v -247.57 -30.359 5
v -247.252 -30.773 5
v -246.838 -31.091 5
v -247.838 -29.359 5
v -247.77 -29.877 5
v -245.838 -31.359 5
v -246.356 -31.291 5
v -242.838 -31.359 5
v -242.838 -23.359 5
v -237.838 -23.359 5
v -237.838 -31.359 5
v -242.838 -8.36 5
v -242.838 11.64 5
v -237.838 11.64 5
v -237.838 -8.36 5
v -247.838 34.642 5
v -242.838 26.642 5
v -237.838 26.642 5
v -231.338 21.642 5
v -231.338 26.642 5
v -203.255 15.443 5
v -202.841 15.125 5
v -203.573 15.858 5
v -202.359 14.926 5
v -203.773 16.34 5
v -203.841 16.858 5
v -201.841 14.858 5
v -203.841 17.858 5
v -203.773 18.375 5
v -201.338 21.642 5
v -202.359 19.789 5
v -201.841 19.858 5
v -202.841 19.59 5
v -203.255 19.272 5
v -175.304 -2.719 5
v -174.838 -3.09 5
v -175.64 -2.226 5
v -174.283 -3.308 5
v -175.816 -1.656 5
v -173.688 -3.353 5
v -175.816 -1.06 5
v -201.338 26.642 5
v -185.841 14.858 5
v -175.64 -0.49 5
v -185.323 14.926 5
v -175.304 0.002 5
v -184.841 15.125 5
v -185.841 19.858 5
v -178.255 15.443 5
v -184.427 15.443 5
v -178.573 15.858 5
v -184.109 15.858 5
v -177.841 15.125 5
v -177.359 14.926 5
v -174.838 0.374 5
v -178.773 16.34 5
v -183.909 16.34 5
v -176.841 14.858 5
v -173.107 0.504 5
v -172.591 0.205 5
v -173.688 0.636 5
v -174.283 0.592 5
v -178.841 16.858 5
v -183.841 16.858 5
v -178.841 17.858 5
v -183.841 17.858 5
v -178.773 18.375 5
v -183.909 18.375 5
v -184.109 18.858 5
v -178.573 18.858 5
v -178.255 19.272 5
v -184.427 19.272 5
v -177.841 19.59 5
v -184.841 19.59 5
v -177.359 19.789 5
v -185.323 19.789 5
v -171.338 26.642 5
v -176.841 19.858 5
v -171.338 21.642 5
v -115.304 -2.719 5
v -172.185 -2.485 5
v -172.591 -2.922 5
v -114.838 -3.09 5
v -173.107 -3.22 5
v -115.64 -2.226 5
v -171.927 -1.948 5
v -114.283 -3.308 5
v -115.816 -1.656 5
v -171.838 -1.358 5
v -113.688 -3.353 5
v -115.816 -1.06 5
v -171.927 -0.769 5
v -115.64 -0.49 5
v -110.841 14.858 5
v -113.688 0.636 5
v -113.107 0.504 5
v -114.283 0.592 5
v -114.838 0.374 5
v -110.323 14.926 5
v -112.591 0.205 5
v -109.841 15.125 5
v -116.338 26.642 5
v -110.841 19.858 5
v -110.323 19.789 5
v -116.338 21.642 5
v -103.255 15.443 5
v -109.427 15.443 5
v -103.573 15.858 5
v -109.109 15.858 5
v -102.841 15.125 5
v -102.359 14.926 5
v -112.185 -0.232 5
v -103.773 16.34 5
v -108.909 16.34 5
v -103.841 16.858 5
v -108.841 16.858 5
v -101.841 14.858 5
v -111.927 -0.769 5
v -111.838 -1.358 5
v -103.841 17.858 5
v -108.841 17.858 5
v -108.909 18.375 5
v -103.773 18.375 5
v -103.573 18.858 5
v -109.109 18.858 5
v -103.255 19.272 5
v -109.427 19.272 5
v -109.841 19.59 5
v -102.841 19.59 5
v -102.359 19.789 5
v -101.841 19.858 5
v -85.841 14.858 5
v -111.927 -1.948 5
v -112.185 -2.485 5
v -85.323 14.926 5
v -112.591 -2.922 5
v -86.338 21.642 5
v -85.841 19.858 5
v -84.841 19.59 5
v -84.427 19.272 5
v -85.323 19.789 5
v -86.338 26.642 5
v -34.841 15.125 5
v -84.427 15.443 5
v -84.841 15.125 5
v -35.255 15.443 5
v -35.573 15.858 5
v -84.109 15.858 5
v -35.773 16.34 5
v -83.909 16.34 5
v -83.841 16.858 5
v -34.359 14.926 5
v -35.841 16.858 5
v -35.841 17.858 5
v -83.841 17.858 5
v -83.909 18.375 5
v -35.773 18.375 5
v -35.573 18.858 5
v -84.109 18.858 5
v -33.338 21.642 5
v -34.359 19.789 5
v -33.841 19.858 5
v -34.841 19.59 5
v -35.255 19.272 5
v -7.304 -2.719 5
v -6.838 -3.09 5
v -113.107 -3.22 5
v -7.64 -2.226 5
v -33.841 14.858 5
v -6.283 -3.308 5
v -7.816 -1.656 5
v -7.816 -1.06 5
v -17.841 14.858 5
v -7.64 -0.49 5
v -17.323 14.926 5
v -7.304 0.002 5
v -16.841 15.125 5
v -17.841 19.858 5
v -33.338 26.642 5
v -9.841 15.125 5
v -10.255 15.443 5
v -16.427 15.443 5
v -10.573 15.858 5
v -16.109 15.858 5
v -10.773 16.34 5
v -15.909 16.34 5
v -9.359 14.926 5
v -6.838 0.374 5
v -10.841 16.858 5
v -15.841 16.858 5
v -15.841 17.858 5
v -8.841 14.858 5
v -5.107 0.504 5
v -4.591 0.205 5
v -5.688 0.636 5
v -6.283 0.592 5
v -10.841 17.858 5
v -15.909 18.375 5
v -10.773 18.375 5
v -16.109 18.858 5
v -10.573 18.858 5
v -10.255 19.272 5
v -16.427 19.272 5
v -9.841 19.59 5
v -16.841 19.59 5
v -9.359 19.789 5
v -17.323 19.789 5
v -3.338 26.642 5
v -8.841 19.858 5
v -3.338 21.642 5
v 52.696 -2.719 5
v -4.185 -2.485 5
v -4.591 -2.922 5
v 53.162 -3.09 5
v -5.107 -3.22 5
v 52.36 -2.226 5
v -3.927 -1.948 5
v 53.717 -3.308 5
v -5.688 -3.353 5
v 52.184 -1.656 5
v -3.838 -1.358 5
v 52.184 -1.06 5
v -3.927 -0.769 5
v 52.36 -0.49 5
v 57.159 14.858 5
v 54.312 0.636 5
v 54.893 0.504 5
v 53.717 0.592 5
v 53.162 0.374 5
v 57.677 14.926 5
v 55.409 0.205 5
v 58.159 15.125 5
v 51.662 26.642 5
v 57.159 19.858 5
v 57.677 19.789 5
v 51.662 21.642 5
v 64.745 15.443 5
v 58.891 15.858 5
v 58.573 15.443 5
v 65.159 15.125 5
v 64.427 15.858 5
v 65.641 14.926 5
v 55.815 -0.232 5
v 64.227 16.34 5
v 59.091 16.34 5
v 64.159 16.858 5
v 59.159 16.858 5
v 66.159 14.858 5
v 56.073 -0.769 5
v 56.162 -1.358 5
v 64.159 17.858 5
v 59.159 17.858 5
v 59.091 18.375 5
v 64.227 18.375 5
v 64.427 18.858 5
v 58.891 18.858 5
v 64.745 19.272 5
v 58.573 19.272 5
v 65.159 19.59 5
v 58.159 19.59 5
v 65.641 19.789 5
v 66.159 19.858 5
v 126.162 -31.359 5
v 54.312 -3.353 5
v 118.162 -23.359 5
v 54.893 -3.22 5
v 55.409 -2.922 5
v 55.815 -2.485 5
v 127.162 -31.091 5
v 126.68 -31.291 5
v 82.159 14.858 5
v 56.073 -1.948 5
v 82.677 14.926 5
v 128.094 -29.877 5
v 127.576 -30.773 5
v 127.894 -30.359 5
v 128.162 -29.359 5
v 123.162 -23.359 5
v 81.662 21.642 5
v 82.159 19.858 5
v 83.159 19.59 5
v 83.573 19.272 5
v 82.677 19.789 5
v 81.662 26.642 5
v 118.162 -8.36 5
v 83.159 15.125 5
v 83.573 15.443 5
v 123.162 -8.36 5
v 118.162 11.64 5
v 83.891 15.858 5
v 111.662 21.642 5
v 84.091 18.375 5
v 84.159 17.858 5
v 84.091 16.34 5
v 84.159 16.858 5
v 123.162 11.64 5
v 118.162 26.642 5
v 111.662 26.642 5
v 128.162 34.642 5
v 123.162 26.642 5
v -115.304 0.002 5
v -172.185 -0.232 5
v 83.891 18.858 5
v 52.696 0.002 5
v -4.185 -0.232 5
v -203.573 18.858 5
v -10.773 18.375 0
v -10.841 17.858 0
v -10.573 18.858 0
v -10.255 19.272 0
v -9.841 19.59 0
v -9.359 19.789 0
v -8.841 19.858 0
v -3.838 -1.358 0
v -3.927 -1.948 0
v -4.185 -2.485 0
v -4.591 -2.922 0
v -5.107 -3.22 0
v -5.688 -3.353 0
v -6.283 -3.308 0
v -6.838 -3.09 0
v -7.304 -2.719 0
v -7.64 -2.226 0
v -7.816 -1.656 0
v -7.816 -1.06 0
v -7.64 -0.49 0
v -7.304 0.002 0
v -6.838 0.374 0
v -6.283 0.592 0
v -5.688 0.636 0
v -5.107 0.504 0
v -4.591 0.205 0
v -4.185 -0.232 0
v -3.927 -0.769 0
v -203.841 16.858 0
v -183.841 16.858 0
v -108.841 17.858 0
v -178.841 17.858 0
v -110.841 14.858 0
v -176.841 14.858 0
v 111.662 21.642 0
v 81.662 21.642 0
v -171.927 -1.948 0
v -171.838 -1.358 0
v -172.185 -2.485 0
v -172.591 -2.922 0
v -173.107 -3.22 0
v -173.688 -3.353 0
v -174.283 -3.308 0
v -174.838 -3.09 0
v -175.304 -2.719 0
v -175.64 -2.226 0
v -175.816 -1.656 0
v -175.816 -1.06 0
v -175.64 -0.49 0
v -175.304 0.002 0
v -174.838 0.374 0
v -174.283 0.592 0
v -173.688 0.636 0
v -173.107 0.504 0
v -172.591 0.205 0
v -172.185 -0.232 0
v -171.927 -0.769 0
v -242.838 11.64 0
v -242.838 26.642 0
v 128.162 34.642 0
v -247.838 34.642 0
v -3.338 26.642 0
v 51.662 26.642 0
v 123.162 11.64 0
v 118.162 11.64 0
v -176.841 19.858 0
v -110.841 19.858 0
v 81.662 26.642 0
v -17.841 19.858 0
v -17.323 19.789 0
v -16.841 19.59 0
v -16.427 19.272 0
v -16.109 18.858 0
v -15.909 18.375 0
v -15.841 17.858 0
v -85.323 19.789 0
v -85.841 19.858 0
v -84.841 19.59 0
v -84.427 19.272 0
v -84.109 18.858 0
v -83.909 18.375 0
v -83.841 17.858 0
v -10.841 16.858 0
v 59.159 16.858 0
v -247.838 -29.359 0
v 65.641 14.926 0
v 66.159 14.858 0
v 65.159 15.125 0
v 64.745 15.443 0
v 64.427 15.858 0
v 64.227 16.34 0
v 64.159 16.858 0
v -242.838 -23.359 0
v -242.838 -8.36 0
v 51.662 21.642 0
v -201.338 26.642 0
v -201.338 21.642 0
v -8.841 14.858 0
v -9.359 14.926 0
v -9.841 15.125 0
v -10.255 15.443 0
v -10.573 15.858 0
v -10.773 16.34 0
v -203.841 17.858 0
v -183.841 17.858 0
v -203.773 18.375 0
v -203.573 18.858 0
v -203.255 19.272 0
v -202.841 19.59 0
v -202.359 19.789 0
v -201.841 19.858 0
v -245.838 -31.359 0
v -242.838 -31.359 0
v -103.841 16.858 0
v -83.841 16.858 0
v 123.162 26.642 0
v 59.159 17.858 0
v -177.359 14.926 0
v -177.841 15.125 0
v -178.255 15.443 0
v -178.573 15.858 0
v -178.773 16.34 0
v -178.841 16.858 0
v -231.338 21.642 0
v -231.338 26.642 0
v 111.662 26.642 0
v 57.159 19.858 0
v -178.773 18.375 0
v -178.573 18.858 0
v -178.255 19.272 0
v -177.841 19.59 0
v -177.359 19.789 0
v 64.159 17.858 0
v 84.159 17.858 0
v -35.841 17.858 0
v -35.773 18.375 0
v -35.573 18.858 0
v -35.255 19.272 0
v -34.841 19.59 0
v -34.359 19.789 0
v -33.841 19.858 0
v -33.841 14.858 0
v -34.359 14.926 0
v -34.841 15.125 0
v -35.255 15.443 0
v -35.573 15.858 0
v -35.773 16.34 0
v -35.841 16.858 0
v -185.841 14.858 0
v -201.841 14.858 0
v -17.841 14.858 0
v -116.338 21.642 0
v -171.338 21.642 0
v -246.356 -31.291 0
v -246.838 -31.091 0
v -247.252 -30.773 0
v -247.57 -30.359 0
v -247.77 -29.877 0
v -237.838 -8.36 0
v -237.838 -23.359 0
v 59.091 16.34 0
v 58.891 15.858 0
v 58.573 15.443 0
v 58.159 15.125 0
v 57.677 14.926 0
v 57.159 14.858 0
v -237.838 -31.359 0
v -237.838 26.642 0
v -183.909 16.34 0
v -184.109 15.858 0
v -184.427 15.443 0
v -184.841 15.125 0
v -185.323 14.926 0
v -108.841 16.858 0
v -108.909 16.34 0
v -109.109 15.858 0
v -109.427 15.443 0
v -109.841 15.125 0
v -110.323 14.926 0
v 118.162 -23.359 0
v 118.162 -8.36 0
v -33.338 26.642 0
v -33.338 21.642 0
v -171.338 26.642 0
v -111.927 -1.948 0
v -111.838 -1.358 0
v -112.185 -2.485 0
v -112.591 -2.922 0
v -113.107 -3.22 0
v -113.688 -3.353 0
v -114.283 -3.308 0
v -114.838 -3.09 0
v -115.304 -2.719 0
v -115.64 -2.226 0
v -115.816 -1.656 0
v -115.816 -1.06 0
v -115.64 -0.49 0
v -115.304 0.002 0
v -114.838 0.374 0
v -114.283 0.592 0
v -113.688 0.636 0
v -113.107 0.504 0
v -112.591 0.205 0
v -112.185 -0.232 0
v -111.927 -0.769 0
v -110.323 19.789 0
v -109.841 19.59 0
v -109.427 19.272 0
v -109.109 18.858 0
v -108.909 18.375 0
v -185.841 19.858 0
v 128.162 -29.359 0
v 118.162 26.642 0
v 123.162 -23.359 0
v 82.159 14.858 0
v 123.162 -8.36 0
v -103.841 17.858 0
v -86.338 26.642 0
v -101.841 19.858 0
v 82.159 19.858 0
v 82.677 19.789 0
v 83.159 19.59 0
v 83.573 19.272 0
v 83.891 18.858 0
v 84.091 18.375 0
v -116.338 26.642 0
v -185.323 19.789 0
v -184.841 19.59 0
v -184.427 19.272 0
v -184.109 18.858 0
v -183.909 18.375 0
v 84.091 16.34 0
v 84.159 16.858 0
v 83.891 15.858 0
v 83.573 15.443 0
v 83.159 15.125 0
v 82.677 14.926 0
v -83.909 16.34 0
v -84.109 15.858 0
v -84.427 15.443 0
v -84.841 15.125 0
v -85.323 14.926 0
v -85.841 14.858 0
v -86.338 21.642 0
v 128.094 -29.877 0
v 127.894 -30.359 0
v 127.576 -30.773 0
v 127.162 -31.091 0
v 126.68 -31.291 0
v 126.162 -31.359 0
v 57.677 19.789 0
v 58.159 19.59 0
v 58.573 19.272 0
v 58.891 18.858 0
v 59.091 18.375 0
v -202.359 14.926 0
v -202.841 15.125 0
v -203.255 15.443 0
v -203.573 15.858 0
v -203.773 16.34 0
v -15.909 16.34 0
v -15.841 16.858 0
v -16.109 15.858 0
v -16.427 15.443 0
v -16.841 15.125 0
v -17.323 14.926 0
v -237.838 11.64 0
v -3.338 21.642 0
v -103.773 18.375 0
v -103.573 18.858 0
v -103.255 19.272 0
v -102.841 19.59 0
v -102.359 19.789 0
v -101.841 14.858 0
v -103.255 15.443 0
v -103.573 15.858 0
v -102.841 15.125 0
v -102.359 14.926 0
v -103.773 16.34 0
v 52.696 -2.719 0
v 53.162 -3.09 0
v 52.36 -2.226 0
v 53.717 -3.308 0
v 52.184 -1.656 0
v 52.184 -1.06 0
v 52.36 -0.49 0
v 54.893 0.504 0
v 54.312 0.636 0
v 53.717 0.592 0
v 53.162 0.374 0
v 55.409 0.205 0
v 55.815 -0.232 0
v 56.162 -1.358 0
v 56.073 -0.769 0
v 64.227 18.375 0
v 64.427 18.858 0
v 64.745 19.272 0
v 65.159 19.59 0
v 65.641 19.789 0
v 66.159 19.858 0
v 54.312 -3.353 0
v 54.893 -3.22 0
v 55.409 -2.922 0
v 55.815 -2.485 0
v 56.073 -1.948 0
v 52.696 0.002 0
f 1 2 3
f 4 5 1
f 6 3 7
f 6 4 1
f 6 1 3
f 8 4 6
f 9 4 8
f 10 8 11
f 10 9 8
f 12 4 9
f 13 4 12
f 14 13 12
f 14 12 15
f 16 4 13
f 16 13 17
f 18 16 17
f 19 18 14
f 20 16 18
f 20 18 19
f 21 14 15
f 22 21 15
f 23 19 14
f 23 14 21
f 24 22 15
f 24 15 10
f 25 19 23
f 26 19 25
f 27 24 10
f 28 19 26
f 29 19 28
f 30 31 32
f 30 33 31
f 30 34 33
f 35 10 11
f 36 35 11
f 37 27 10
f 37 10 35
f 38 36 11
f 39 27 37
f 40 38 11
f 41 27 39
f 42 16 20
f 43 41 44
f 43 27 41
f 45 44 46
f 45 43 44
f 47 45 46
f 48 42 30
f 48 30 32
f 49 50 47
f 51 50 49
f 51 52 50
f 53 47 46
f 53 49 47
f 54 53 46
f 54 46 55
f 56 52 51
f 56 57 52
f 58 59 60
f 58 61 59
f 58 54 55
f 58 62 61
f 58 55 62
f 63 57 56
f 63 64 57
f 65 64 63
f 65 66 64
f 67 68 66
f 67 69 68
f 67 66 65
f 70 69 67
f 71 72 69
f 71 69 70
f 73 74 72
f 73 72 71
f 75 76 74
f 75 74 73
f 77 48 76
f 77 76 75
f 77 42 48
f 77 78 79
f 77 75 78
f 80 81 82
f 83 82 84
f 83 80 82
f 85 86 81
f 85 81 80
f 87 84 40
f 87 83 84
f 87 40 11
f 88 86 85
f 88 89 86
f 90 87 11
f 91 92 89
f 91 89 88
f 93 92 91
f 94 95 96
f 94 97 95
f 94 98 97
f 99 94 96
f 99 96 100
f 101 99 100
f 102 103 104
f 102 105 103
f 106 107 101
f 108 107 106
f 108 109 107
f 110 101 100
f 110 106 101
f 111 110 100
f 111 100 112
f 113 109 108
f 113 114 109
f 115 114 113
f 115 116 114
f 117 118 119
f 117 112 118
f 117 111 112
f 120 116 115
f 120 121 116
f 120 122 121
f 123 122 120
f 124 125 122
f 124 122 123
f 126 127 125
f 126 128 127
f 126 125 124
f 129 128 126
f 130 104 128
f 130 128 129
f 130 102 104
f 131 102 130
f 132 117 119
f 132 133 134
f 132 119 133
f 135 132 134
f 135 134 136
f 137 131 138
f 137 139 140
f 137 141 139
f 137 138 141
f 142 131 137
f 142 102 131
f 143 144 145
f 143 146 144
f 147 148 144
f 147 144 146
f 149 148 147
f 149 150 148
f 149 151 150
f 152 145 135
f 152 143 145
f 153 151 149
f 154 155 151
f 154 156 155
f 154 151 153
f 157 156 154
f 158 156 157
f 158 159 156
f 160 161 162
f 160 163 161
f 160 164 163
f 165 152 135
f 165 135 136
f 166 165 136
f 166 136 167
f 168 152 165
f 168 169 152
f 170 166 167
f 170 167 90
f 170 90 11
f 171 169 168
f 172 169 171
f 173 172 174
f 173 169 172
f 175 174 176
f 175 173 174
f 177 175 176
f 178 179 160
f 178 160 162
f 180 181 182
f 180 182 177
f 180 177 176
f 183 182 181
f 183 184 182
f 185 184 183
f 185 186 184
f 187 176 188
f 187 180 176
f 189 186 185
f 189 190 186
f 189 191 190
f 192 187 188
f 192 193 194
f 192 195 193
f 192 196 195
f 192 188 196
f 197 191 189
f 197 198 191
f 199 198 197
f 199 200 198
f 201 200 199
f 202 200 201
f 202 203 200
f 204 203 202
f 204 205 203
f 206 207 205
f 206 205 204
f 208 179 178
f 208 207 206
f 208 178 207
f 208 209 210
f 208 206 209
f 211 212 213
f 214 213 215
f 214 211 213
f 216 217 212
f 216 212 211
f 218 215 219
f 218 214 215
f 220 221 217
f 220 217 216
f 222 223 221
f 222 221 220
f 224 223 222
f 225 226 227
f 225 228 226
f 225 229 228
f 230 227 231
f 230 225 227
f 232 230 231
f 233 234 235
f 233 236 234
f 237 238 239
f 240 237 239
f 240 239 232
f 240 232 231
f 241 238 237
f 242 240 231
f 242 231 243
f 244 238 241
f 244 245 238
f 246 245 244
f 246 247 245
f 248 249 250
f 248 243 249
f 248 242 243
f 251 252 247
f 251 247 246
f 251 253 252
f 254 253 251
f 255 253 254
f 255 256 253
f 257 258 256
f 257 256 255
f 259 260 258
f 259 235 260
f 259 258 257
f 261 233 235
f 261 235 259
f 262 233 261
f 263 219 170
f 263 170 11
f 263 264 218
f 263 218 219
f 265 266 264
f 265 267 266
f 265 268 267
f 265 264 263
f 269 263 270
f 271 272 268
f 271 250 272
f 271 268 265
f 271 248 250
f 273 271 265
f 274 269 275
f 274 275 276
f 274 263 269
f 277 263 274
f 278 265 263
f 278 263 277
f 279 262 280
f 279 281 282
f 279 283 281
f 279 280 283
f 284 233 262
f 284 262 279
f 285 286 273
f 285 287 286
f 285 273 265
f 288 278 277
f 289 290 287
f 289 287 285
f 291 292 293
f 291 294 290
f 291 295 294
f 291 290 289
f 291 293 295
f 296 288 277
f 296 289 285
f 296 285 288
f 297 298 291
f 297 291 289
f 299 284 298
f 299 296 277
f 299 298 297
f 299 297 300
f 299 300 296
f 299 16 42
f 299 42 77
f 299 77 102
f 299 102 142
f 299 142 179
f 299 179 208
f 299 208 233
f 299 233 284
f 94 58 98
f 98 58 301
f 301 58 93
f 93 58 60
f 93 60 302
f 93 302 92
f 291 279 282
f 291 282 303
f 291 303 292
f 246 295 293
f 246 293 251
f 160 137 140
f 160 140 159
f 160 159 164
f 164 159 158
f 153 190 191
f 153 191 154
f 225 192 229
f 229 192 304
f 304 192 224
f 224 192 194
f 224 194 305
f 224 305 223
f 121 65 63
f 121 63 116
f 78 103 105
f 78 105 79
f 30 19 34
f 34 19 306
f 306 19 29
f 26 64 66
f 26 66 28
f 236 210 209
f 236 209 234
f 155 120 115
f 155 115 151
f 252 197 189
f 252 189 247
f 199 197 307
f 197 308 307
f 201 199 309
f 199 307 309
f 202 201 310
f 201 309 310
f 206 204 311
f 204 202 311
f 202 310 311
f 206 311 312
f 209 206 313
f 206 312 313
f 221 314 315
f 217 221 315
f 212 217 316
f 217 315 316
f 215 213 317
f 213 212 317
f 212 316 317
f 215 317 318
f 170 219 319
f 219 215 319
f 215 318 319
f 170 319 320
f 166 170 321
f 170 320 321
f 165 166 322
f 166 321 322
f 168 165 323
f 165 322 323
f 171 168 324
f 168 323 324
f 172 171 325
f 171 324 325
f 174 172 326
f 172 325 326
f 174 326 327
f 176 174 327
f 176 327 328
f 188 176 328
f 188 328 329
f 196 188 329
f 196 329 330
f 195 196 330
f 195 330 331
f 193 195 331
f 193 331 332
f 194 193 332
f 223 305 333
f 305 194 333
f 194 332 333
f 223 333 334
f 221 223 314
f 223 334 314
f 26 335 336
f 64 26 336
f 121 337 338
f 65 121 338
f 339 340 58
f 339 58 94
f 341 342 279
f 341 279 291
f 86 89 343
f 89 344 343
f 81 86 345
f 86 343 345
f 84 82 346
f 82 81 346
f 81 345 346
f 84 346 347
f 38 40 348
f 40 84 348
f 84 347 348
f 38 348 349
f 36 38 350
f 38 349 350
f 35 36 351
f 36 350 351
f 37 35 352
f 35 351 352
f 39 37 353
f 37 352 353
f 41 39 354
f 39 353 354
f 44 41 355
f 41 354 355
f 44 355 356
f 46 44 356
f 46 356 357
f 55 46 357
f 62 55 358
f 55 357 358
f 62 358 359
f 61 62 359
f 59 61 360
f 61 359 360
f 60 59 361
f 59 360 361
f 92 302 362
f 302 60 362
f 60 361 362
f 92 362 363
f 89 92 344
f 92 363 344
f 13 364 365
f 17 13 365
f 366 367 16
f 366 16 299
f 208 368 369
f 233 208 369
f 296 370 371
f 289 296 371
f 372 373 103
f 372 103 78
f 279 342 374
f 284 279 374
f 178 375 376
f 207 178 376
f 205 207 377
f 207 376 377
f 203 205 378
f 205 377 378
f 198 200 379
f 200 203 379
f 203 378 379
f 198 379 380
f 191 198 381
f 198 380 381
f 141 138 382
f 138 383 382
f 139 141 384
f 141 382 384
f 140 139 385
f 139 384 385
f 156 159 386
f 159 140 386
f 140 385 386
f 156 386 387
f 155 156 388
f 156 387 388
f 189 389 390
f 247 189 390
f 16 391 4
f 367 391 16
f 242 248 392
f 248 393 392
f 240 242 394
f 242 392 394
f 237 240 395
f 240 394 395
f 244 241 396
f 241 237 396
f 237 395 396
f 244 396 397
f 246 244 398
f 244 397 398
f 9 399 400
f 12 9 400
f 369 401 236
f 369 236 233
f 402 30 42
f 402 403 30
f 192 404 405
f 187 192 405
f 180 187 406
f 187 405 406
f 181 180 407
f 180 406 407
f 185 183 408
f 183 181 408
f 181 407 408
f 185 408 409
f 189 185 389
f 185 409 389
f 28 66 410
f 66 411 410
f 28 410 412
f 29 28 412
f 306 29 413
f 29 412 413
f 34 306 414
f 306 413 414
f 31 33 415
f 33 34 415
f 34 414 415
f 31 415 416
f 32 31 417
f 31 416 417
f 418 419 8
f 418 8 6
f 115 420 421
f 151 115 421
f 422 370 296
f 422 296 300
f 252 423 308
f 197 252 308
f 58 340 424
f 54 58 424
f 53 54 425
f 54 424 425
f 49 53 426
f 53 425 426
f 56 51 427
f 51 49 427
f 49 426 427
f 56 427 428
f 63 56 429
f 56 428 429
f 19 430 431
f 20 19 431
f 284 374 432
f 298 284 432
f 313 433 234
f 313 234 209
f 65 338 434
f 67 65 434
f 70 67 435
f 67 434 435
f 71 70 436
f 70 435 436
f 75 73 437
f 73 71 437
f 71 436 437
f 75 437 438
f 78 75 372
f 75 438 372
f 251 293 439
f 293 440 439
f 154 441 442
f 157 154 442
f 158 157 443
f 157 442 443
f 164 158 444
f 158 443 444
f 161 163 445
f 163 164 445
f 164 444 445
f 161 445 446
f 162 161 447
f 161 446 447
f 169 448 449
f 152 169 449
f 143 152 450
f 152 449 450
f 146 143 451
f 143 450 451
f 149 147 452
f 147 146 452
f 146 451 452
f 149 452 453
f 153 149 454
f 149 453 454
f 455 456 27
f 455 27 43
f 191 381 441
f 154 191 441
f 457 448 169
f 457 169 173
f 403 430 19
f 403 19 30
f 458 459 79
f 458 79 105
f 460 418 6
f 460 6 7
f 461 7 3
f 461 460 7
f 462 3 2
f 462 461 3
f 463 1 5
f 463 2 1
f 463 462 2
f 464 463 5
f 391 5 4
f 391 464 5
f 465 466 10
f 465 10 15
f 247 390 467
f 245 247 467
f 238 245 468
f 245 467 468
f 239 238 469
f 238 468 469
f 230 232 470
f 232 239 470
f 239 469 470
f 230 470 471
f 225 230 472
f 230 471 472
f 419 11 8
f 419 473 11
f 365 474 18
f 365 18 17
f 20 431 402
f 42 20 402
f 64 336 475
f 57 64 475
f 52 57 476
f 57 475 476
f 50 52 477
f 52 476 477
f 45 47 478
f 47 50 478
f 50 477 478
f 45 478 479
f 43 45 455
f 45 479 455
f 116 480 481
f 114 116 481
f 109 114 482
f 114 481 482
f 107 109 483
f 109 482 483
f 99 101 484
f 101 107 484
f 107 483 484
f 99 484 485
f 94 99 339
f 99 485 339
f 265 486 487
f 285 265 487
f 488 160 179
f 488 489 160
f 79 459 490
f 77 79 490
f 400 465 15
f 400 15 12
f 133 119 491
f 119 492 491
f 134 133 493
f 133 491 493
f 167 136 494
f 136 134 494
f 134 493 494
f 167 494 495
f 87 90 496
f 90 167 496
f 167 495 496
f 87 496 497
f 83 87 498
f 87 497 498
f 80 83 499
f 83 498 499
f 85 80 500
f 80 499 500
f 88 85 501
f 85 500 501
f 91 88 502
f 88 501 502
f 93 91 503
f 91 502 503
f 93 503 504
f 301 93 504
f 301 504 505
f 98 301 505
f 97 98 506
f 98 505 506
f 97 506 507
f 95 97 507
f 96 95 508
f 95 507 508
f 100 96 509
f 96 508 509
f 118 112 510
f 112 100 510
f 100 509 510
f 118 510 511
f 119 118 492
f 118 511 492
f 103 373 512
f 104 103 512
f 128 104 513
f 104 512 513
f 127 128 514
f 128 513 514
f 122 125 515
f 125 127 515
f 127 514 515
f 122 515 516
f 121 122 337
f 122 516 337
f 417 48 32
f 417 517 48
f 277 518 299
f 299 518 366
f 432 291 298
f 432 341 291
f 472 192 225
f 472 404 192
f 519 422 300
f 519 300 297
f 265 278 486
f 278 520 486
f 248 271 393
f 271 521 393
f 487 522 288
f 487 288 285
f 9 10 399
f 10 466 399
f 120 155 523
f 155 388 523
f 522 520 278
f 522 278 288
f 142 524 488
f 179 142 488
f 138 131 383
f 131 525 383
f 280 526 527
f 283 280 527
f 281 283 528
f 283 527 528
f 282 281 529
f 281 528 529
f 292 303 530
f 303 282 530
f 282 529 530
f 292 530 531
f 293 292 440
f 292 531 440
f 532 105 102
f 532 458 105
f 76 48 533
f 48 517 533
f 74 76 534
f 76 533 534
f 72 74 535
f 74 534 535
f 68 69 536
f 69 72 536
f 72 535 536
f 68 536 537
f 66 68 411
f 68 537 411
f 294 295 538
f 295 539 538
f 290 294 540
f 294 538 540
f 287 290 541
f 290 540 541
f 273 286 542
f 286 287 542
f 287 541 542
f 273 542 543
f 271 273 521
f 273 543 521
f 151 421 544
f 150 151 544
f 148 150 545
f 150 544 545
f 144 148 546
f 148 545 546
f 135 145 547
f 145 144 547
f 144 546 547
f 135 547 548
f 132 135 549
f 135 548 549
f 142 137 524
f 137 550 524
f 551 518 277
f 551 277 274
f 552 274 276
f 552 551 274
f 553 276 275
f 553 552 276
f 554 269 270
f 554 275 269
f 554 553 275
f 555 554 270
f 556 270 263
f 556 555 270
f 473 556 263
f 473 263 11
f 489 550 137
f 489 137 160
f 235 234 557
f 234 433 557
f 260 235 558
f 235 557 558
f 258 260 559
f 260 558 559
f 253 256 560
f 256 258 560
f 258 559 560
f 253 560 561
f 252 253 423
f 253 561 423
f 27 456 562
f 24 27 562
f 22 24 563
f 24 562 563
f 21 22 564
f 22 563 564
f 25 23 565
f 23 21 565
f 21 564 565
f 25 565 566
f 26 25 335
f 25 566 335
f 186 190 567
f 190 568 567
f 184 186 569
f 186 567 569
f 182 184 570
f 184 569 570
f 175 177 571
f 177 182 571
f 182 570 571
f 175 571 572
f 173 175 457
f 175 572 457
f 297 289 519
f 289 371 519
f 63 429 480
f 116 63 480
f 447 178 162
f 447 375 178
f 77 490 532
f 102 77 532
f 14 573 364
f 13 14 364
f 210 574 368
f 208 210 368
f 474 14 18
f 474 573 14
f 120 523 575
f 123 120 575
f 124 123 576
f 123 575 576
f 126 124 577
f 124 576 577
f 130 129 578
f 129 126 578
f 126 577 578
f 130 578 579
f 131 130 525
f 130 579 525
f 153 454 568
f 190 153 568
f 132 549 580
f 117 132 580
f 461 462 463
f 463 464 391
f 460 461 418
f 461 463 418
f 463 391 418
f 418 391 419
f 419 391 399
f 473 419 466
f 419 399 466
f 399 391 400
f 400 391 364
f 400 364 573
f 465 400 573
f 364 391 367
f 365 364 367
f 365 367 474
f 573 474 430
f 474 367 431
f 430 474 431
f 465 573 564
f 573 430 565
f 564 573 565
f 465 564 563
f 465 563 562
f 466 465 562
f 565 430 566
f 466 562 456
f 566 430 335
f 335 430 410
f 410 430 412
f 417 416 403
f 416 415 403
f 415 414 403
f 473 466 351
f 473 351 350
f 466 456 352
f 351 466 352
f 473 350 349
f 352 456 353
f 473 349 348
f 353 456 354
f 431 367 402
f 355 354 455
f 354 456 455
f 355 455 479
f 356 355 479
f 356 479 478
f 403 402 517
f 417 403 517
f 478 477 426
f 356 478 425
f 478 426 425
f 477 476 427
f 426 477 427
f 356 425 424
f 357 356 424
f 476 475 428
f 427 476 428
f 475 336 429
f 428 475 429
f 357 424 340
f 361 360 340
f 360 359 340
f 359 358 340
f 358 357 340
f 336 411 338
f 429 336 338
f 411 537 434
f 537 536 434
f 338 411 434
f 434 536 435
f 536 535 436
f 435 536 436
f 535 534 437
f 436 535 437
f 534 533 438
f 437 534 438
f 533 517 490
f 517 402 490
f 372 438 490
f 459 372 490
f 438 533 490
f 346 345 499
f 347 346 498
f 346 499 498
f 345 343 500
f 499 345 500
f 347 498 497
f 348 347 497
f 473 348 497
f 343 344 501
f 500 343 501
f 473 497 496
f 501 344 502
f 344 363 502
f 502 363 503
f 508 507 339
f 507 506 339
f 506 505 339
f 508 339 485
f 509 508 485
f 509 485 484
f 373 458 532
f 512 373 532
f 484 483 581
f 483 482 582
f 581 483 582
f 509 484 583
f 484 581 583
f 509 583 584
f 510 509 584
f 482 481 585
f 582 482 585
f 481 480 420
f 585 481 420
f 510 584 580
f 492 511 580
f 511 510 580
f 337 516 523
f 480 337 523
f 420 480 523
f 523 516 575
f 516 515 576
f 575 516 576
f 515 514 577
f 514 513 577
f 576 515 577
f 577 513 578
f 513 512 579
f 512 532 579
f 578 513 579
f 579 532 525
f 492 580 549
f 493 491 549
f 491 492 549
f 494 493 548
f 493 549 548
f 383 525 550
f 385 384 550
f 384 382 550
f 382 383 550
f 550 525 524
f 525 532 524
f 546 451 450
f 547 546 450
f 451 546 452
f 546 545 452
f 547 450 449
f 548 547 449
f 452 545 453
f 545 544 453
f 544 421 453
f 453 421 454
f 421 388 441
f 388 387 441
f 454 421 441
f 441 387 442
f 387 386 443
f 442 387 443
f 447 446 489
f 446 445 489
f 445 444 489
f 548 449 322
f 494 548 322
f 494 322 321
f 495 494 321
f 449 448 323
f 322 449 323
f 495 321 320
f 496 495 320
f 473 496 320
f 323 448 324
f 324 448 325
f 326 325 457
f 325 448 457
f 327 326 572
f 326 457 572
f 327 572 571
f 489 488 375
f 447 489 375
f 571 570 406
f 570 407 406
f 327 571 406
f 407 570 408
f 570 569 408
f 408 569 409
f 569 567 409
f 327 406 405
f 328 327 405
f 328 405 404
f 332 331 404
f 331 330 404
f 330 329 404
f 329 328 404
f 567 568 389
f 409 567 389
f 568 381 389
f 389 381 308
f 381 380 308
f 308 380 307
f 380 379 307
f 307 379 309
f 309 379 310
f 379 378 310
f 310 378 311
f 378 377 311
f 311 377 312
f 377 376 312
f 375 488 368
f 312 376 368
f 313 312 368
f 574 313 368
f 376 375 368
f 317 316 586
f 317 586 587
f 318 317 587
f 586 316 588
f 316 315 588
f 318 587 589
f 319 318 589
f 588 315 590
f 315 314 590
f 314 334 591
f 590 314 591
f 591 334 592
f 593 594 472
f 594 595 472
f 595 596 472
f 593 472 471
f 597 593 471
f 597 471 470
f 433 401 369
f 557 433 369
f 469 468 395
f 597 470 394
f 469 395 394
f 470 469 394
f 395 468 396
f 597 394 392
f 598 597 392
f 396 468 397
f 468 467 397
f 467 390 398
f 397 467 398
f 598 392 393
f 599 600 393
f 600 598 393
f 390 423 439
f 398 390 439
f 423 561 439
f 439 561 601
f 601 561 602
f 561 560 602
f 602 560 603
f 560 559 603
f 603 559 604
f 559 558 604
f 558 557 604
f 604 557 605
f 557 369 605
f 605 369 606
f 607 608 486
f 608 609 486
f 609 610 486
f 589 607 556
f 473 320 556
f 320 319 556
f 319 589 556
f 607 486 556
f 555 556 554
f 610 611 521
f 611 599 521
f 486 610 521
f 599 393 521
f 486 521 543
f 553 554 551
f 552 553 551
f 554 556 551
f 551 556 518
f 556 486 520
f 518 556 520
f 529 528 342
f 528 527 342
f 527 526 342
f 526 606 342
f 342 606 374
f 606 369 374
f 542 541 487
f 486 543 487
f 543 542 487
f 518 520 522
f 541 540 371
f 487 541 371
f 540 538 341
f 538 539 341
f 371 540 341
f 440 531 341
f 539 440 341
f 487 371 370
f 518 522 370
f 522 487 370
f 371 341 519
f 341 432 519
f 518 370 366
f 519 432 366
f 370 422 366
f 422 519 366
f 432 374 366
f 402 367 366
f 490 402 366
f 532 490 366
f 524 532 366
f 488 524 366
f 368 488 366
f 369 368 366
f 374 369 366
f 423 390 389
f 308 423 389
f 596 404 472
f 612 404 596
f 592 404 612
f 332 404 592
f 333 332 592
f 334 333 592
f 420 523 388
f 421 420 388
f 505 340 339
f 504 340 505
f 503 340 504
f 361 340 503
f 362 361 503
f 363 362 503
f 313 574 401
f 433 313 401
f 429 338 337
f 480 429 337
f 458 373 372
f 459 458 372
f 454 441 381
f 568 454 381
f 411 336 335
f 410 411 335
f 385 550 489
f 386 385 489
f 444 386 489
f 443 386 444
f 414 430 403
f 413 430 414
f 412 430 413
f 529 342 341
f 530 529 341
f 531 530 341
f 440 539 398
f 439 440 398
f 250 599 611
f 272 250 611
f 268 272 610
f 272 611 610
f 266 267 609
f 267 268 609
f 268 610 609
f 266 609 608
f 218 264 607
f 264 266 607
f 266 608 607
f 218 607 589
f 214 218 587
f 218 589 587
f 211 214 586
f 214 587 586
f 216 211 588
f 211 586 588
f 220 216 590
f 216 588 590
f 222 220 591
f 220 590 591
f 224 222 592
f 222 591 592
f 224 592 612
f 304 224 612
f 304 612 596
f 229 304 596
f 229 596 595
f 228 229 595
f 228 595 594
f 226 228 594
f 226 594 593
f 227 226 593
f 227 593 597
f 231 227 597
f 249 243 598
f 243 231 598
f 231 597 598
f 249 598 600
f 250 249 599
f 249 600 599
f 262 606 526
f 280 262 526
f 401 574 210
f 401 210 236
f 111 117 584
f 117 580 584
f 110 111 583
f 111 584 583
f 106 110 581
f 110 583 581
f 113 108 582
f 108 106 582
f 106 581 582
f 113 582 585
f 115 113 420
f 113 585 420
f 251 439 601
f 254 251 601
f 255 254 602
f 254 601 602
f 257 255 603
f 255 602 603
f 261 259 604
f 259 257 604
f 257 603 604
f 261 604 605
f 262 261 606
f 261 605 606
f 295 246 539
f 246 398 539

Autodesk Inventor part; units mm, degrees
ref_plane "YZ Plane" through (0, 0, 0) normal (1, 0, 0) x (0, 1, 0)
ref_plane "XZ Plane" through (0, 0, 0) normal (0, 1, 0) x (-1, 0, 0)
ref_plane "XY Plane" through (0, 0, 0) normal (0, 0, 1) x (1, 0, 0)
sketch "Sketch1" plane through (0, 0, 0) normal (0, 0, 1) x (1, 0, 0)
  circle A0 centre (-5.8379, -1.3582) radius 2
  circle A1 centre (54.1621, -1.3582) radius 2
  line L0 (81.6621, 21.6418) -> (111.6621, 21.6418) projected
  line L1 (111.6621, 21.6418) -> (111.6621, 26.6418) projected
  line L2 (81.6621, 26.6418) -> (111.6621, 26.6418) projected
  line L3 (81.6621, 21.6418) -> (81.6621, 26.6418) projected
  line L4 (-3.3379, 21.6418) -> (51.6621, 21.6418) projected
  line L5 (51.6621, 21.6418) -> (51.6621, 26.6418) projected
  line L6 (-3.3379, 26.6418) -> (51.6621, 26.6418) projected
  line L7 (-3.3379, 21.6418) -> (-3.3379, 26.6418) projected
  line L8 (-86.3379, 21.6418) -> (-33.3379, 21.6418) projected
  line L9 (-33.3379, 21.6418) -> (-33.3379, 26.6418) projected
  line L10 (-86.3379, 26.6418) -> (-33.3379, 26.6418) projected
  line L11 (-86.3379, 21.6418) -> (-86.3379, 26.6418) projected
  line L12 (-171.3379, 21.6418) -> (-116.3379, 21.6418) projected
  line L13 (-116.3379, 21.6418) -> (-116.3379, 26.6418) projected
  line L14 (-171.3379, 26.6418) -> (-116.3379, 26.6418) projected
  line L15 (-171.3379, 21.6418) -> (-171.3379, 26.6418) projected
  line L16 (-231.3379, 21.6418) -> (-201.3379, 21.6418) projected
  line L17 (-201.3379, 21.6418) -> (-201.3379, 26.6418) projected
  line L18 (-231.3379, 26.6418) -> (-201.3379, 26.6418) projected
  line L19 (-231.3379, 21.6418) -> (-231.3379, 26.6418) projected
  line L20 (126.1621, -31.3589) -> (-245.8379, -31.3589)
  line L21 (-247.8379, -29.3589) -> (-247.8379, 34.6418)
  line L22 (128.1621, -29.3589) -> (128.1621, 34.6418)
  line L23 (-247.8379, 34.6418) -> (128.1621, 34.6418)
  arc A2 (-247.8379, -29.3589) -> (-245.8379, -31.3589) centre (-245.8379, -29.3589) ccw
  arc A3 (126.1621, -31.3589) -> (128.1621, -29.3589) centre (126.1621, -29.3589) ccw
  line L24 (123.1621, -23.3589) -> (123.1621, -8.3597) projected
  line L25 (123.1621, -8.3597) -> (118.1621, -8.3597) projected
  line L26 (118.1621, -23.3589) -> (118.1621, -8.3597) projected
  line L27 (123.1621, -23.3589) -> (118.1621, -23.3589) projected
  line L28 (123.1621, 11.6403) -> (123.1621, 26.6418) projected
  line L29 (123.1621, 26.6418) -> (118.1621, 26.6418) projected
  line L30 (118.1621, 11.6403) -> (118.1621, 26.6418) projected
  line L31 (123.1621, 11.6403) -> (118.1621, 11.6403) projected
  line L32 (-237.8379, -23.3589) -> (-237.8379, -8.3597) projected
  line L33 (-237.8379, -8.3597) -> (-242.8379, -8.3597) projected
  line L34 (-242.8379, -23.3589) -> (-242.8379, -8.3597) projected
  line L35 (-237.8379, -23.3589) -> (-242.8379, -23.3589) projected
  line L36 (-237.8379, 11.6403) -> (-237.8379, 26.6418) projected
  line L37 (-237.8379, 26.6418) -> (-242.8379, 26.6418) projected
  line L38 (-242.8379, 11.6403) -> (-242.8379, 26.6418) projected
  line L39 (-237.8379, 11.6403) -> (-242.8379, 11.6403) projected
  line L40 (-201.8409, 14.8575) -> (-185.8409, 14.8575)
  line L41 (-185.8409, 19.8575) -> (-201.8409, 19.8575)
  line L42 (-85.8409, 14.8575) -> (-101.8409, 14.8575)
  line L43 (-101.8409, 19.8575) -> (-85.8409, 19.8575)
  line L44 (-176.8409, 14.8575) -> (-110.8409, 14.8575)
  line L45 (-110.8409, 19.8575) -> (-176.8409, 19.8575)
  arc A4 (-178.8409, 16.8575) -> (-176.8409, 14.8575) centre (-176.8409, 16.8575) ccw
  arc A5 (-108.8409, 17.8575) -> (-110.8409, 19.8575) centre (-110.8409, 17.8575) ccw
  arc A6 (-110.8409, 14.8575) -> (-108.8409, 16.8575) centre (-110.8409, 16.8575) ccw
  arc A7 (-103.8409, 16.8575) -> (-101.8409, 14.8575) centre (-101.8409, 16.8575) ccw
  arc A8 (-101.8409, 19.8575) -> (-103.8409, 17.8575) centre (-101.8409, 17.8575) ccw
  arc A9 (-83.8409, 17.8575) -> (-85.8409, 19.8575) centre (-85.8409, 17.8575) ccw
  arc A10 (-85.8409, 14.8575) -> (-83.8409, 16.8575) centre (-85.8409, 16.8575) ccw
  arc A11 (-183.8409, 17.8575) -> (-185.8409, 19.8575) centre (-185.8409, 17.8575) ccw
  arc A12 (-185.8409, 14.8575) -> (-183.8409, 16.8575) centre (-185.8409, 16.8575) ccw
  arc A13 (-203.8409, 16.8575) -> (-201.8409, 14.8575) centre (-201.8409, 16.8575) ccw
  arc A14 (-201.8409, 19.8575) -> (-203.8409, 17.8575) centre (-201.8409, 17.8575) ccw
  arc A15 (-176.8409, 19.8575) -> (-178.8409, 17.8575) centre (-176.8409, 17.8575) ccw
  line L46 (-203.8409, 16.8575) -> (-183.8409, 16.8575)
  line L47 (-183.8409, 17.8575) -> (-203.8409, 17.8575)
  line L48 (-178.8409, 16.8575) -> (-108.8409, 16.8575)
  line L49 (-108.8409, 17.8575) -> (-178.8409, 17.8575)
  line L50 (-103.8409, 16.8575) -> (-83.8409, 16.8575)
  line L51 (-83.8409, 17.8575) -> (-103.8409, 17.8575)
  line L52 (57.1591, 19.8575) -> (-8.8409, 19.8575)
  line L53 (-8.8409, 14.8575) -> (57.1591, 14.8575)
  line L54 (59.1591, 17.8575) -> (-10.8409, 17.8575)
  line L55 (-10.8409, 16.8575) -> (59.1591, 16.8575)
  arc A16 (59.1591, 17.8575) -> (57.1591, 19.8575) centre (57.1591, 17.8575) ccw
  arc A17 (57.1591, 14.8575) -> (59.1591, 16.8575) centre (57.1591, 16.8575) ccw
  arc A18 (64.1591, 16.8575) -> (66.1591, 14.8575) centre (66.1591, 16.8575) ccw
  arc A19 (66.1591, 19.8575) -> (64.1591, 17.8575) centre (66.1591, 17.8575) ccw
  line L56 (82.1591, 14.8575) -> (66.1591, 14.8575)
  line L57 (66.1591, 19.8575) -> (82.1591, 19.8575)
  arc A20 (82.1591, 14.8575) -> (84.1591, 16.8575) centre (82.1591, 16.8575) ccw
  arc A21 (84.1591, 17.8575) -> (82.1591, 19.8575) centre (82.1591, 17.8575) ccw
  line L58 (-33.8409, 14.8575) -> (-17.8409, 14.8575)
  line L59 (-17.8409, 19.8575) -> (-33.8409, 19.8575)
  arc A22 (-10.8409, 16.8575) -> (-8.8409, 14.8575) centre (-8.8409, 16.8575) ccw
  arc A23 (-8.8409, 19.8575) -> (-10.8409, 17.8575) centre (-8.8409, 17.8575) ccw
  arc A24 (-17.8409, 14.8575) -> (-15.8409, 16.8575) centre (-17.8409, 16.8575) ccw
  arc A25 (-15.8409, 17.8575) -> (-17.8409, 19.8575) centre (-17.8409, 17.8575) ccw
  arc A26 (-33.8409, 19.8575) -> (-35.8409, 17.8575) centre (-33.8409, 17.8575) ccw
  line L60 (-35.8409, 16.8575) -> (-15.8409, 16.8575)
  line L61 (-15.8409, 17.8575) -> (-35.8409, 17.8575)
  arc A27 (-35.8409, 16.8575) -> (-33.8409, 14.8575) centre (-33.8409, 16.8575) ccw
  line L62 (64.1591, 16.8575) -> (84.1591, 16.8575)
  line L63 (84.1591, 17.8575) -> (64.1591, 17.8575)
  circle A28 centre (-173.8379, -1.3582) radius 2
  circle A29 centre (-113.8379, -1.3582) radius 2
  line L64 (-237.8379, -31.3589) -> (-242.8379, -31.3589) projected
  point P0 (24.1621, -1.3582)
  point P1 (-203.8409, 14.8575)
  point P2 (-203.8409, 19.8575)
  point P3 (-35.8409, 14.8575)
  point P4 (-35.8409, 19.8575)
  point P5 (-143.8379, -1.3582)
  dimension "d36" = 4
  dimension "d37" = 4
  dimension "d40" = 30
  dimension "d41" = 30
  dimension "d48" = 2
  dimension "d53" = 2
  dimension "d55" = 8
  dimension "d56" = 5
  dimension "d57" = 2
  dimension "d58" = 5
  dimension "d59" = 2
  dimension "d60" = 376
  dimension "d63" = 28
  dimension "d64" = 28
  dimension "d65" = 28
  dimension "d66" = 4
  dimension "d67" = 4
  dimension "d68" = 30
  dimension "d69" = 30
  dimension "d70" = 74
  dimension "d71" = 74
  dimension "d72" = 28
  dimension "d73" = 28
  dimension "d74" = 2.5
  dimension "d75" = 2.5
  dimension "d76" = 2.5
  dimension "d77" = 0
extrude "Extrusion1" add sketch "Sketch1" along normal blind 5
properties part number "case bottom front" material "Nylon, molybdenum disulphide"
